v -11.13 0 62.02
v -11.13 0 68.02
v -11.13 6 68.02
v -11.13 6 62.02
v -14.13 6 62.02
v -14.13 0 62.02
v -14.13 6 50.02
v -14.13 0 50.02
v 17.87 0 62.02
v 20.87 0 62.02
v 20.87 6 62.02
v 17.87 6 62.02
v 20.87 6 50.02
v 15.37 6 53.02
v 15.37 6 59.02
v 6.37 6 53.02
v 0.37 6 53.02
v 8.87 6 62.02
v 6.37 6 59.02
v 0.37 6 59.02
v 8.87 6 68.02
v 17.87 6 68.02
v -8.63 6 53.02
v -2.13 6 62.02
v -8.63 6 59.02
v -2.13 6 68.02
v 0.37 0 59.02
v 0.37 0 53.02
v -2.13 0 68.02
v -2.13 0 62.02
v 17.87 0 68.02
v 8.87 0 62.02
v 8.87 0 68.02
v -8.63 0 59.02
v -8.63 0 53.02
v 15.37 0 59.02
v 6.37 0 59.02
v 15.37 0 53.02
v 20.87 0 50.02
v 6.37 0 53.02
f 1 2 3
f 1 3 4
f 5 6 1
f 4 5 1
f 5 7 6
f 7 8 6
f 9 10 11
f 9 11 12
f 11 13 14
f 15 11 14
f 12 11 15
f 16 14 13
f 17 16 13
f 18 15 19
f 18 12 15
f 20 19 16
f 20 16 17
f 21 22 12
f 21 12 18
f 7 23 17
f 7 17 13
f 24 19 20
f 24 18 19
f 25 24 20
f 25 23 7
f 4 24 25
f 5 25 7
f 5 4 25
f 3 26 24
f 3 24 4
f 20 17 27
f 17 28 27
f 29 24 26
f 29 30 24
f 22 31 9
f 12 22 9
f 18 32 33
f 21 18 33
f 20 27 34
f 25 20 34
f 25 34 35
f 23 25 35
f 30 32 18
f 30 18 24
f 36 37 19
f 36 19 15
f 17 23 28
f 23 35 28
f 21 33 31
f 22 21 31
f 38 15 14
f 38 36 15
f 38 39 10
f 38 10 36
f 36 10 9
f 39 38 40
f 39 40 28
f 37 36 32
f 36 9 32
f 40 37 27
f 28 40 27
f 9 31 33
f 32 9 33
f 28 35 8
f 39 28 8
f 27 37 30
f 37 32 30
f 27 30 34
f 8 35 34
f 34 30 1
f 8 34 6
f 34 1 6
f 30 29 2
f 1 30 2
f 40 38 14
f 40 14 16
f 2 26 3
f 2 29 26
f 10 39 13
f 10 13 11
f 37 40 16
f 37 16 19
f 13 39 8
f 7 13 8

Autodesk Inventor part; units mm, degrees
ref_plane "YZ Plane" through (0, 0, 0) normal (1, 0, 0) x (0, 1, 0)
ref_plane "XZ Plane" through (0, 0, 0) normal (0, 1, 0) x (-1, 0, 0)
ref_plane "XY Plane" through (0, 0, 0) normal (0, 0, 1) x (1, 0, 0)
sketch "Sketch1" plane through (0, 0, 0) normal (0, 1, 0) x (-1, 0, 0)
  line L0 (11.1299, 50.0199) -> (11.1299, 62.0199)
  line L1 (-17.8701, 62.0199) -> (-17.8701, 50.0199)
  line L2 (-17.8701, 50.0199) -> (-3.3701, 50.0199)
  line L3 (-3.3701, 50.0199) -> (-3.3701, 62.0199) construction
  line L4 (-17.8701, 56.0199) -> (-3.3701, 56.0199) construction
  line L5 (-17.8701, 62.0199) -> (11.1299, 62.0199)
  line L6 (-17.8701, 62.0199) -> (-8.8701, 62.0199)
  line L7 (-8.8701, 62.0199) -> (-8.8701, 68.0199)
  line L8 (-8.8701, 68.0199) -> (-17.8701, 68.0199)
  line L9 (-17.8701, 68.0199) -> (-17.8701, 62.0199)
  line L10 (11.1299, 62.0199) -> (2.1299, 62.0199)
  line L11 (2.1299, 62.0199) -> (2.1299, 68.0199)
  line L12 (2.1299, 68.0199) -> (11.1299, 68.0199)
  line L13 (11.1299, 68.0199) -> (11.1299, 62.0199)
  line L14 (-3.3701, 56.0199) -> (11.1299, 56.0199) construction
  line L15 (-3.3701, 50.0199) -> (11.1299, 50.0199)
  line L16 (-0.3701, 59.0199) -> (8.6299, 59.0199)
  line L17 (8.6299, 59.0199) -> (8.6299, 53.0199)
  line L18 (8.6299, 53.0199) -> (-0.3701, 53.0199)
  line L19 (-0.3701, 53.0199) -> (-0.3701, 59.0199)
  line L20 (-0.3701, 59.0199) -> (8.6299, 53.0199) construction
  line L21 (8.6299, 59.0199) -> (-0.3701, 53.0199) construction
  line L22 (-6.3701, 59.0199) -> (-15.3701, 59.0199)
  line L23 (-15.3701, 59.0199) -> (-15.3701, 53.0199)
  line L24 (-15.3701, 53.0199) -> (-6.3701, 53.0199)
  line L25 (-6.3701, 53.0199) -> (-6.3701, 59.0199)
  line L26 (-6.3701, 59.0199) -> (-15.3701, 53.0199) construction
  line L27 (-15.3701, 59.0199) -> (-6.3701, 53.0199) construction
  line L28 (11.1299, 50.0199) -> (14.1299, 50.0199)
  line L29 (14.1299, 50.0199) -> (14.1299, 62.0199)
  line L30 (14.1299, 62.0199) -> (11.1299, 62.0199)
  line L31 (11.1299, 62.0199) -> (11.1299, 50.0199)
  line L32 (-17.8701, 50.0199) -> (-17.8701, 62.0199)
  line L33 (-17.8701, 50.0199) -> (-20.8701, 50.0199)
  line L34 (-20.8701, 50.0199) -> (-20.8701, 62.0199)
  line L35 (-20.8701, 62.0199) -> (-17.8701, 62.0199)
  line L36 (-17.8701, 62.0199) -> (-17.8701, 50.0199)
  point P0 (4.1299, 56.0199)
  point P1 (-10.8701, 56.0199)
  dimension "d0" = 29
  dimension "d1" = 12
  dimension "d18" = 9
  dimension "d19" = 6
  dimension "d20" = 14.5
  dimension "d61" = 9
  dimension "d62" = 6
  dimension "d63" = 6
  dimension "d64" = 3
  dimension "d65" = 3
  dimension "d66" = 12
extrude "Extrusion1" add sketch "Sketch1" along normal blind 6
equation "\"d66\" = d1"
properties part number "thumper-bumper-sidewall2-v3"
